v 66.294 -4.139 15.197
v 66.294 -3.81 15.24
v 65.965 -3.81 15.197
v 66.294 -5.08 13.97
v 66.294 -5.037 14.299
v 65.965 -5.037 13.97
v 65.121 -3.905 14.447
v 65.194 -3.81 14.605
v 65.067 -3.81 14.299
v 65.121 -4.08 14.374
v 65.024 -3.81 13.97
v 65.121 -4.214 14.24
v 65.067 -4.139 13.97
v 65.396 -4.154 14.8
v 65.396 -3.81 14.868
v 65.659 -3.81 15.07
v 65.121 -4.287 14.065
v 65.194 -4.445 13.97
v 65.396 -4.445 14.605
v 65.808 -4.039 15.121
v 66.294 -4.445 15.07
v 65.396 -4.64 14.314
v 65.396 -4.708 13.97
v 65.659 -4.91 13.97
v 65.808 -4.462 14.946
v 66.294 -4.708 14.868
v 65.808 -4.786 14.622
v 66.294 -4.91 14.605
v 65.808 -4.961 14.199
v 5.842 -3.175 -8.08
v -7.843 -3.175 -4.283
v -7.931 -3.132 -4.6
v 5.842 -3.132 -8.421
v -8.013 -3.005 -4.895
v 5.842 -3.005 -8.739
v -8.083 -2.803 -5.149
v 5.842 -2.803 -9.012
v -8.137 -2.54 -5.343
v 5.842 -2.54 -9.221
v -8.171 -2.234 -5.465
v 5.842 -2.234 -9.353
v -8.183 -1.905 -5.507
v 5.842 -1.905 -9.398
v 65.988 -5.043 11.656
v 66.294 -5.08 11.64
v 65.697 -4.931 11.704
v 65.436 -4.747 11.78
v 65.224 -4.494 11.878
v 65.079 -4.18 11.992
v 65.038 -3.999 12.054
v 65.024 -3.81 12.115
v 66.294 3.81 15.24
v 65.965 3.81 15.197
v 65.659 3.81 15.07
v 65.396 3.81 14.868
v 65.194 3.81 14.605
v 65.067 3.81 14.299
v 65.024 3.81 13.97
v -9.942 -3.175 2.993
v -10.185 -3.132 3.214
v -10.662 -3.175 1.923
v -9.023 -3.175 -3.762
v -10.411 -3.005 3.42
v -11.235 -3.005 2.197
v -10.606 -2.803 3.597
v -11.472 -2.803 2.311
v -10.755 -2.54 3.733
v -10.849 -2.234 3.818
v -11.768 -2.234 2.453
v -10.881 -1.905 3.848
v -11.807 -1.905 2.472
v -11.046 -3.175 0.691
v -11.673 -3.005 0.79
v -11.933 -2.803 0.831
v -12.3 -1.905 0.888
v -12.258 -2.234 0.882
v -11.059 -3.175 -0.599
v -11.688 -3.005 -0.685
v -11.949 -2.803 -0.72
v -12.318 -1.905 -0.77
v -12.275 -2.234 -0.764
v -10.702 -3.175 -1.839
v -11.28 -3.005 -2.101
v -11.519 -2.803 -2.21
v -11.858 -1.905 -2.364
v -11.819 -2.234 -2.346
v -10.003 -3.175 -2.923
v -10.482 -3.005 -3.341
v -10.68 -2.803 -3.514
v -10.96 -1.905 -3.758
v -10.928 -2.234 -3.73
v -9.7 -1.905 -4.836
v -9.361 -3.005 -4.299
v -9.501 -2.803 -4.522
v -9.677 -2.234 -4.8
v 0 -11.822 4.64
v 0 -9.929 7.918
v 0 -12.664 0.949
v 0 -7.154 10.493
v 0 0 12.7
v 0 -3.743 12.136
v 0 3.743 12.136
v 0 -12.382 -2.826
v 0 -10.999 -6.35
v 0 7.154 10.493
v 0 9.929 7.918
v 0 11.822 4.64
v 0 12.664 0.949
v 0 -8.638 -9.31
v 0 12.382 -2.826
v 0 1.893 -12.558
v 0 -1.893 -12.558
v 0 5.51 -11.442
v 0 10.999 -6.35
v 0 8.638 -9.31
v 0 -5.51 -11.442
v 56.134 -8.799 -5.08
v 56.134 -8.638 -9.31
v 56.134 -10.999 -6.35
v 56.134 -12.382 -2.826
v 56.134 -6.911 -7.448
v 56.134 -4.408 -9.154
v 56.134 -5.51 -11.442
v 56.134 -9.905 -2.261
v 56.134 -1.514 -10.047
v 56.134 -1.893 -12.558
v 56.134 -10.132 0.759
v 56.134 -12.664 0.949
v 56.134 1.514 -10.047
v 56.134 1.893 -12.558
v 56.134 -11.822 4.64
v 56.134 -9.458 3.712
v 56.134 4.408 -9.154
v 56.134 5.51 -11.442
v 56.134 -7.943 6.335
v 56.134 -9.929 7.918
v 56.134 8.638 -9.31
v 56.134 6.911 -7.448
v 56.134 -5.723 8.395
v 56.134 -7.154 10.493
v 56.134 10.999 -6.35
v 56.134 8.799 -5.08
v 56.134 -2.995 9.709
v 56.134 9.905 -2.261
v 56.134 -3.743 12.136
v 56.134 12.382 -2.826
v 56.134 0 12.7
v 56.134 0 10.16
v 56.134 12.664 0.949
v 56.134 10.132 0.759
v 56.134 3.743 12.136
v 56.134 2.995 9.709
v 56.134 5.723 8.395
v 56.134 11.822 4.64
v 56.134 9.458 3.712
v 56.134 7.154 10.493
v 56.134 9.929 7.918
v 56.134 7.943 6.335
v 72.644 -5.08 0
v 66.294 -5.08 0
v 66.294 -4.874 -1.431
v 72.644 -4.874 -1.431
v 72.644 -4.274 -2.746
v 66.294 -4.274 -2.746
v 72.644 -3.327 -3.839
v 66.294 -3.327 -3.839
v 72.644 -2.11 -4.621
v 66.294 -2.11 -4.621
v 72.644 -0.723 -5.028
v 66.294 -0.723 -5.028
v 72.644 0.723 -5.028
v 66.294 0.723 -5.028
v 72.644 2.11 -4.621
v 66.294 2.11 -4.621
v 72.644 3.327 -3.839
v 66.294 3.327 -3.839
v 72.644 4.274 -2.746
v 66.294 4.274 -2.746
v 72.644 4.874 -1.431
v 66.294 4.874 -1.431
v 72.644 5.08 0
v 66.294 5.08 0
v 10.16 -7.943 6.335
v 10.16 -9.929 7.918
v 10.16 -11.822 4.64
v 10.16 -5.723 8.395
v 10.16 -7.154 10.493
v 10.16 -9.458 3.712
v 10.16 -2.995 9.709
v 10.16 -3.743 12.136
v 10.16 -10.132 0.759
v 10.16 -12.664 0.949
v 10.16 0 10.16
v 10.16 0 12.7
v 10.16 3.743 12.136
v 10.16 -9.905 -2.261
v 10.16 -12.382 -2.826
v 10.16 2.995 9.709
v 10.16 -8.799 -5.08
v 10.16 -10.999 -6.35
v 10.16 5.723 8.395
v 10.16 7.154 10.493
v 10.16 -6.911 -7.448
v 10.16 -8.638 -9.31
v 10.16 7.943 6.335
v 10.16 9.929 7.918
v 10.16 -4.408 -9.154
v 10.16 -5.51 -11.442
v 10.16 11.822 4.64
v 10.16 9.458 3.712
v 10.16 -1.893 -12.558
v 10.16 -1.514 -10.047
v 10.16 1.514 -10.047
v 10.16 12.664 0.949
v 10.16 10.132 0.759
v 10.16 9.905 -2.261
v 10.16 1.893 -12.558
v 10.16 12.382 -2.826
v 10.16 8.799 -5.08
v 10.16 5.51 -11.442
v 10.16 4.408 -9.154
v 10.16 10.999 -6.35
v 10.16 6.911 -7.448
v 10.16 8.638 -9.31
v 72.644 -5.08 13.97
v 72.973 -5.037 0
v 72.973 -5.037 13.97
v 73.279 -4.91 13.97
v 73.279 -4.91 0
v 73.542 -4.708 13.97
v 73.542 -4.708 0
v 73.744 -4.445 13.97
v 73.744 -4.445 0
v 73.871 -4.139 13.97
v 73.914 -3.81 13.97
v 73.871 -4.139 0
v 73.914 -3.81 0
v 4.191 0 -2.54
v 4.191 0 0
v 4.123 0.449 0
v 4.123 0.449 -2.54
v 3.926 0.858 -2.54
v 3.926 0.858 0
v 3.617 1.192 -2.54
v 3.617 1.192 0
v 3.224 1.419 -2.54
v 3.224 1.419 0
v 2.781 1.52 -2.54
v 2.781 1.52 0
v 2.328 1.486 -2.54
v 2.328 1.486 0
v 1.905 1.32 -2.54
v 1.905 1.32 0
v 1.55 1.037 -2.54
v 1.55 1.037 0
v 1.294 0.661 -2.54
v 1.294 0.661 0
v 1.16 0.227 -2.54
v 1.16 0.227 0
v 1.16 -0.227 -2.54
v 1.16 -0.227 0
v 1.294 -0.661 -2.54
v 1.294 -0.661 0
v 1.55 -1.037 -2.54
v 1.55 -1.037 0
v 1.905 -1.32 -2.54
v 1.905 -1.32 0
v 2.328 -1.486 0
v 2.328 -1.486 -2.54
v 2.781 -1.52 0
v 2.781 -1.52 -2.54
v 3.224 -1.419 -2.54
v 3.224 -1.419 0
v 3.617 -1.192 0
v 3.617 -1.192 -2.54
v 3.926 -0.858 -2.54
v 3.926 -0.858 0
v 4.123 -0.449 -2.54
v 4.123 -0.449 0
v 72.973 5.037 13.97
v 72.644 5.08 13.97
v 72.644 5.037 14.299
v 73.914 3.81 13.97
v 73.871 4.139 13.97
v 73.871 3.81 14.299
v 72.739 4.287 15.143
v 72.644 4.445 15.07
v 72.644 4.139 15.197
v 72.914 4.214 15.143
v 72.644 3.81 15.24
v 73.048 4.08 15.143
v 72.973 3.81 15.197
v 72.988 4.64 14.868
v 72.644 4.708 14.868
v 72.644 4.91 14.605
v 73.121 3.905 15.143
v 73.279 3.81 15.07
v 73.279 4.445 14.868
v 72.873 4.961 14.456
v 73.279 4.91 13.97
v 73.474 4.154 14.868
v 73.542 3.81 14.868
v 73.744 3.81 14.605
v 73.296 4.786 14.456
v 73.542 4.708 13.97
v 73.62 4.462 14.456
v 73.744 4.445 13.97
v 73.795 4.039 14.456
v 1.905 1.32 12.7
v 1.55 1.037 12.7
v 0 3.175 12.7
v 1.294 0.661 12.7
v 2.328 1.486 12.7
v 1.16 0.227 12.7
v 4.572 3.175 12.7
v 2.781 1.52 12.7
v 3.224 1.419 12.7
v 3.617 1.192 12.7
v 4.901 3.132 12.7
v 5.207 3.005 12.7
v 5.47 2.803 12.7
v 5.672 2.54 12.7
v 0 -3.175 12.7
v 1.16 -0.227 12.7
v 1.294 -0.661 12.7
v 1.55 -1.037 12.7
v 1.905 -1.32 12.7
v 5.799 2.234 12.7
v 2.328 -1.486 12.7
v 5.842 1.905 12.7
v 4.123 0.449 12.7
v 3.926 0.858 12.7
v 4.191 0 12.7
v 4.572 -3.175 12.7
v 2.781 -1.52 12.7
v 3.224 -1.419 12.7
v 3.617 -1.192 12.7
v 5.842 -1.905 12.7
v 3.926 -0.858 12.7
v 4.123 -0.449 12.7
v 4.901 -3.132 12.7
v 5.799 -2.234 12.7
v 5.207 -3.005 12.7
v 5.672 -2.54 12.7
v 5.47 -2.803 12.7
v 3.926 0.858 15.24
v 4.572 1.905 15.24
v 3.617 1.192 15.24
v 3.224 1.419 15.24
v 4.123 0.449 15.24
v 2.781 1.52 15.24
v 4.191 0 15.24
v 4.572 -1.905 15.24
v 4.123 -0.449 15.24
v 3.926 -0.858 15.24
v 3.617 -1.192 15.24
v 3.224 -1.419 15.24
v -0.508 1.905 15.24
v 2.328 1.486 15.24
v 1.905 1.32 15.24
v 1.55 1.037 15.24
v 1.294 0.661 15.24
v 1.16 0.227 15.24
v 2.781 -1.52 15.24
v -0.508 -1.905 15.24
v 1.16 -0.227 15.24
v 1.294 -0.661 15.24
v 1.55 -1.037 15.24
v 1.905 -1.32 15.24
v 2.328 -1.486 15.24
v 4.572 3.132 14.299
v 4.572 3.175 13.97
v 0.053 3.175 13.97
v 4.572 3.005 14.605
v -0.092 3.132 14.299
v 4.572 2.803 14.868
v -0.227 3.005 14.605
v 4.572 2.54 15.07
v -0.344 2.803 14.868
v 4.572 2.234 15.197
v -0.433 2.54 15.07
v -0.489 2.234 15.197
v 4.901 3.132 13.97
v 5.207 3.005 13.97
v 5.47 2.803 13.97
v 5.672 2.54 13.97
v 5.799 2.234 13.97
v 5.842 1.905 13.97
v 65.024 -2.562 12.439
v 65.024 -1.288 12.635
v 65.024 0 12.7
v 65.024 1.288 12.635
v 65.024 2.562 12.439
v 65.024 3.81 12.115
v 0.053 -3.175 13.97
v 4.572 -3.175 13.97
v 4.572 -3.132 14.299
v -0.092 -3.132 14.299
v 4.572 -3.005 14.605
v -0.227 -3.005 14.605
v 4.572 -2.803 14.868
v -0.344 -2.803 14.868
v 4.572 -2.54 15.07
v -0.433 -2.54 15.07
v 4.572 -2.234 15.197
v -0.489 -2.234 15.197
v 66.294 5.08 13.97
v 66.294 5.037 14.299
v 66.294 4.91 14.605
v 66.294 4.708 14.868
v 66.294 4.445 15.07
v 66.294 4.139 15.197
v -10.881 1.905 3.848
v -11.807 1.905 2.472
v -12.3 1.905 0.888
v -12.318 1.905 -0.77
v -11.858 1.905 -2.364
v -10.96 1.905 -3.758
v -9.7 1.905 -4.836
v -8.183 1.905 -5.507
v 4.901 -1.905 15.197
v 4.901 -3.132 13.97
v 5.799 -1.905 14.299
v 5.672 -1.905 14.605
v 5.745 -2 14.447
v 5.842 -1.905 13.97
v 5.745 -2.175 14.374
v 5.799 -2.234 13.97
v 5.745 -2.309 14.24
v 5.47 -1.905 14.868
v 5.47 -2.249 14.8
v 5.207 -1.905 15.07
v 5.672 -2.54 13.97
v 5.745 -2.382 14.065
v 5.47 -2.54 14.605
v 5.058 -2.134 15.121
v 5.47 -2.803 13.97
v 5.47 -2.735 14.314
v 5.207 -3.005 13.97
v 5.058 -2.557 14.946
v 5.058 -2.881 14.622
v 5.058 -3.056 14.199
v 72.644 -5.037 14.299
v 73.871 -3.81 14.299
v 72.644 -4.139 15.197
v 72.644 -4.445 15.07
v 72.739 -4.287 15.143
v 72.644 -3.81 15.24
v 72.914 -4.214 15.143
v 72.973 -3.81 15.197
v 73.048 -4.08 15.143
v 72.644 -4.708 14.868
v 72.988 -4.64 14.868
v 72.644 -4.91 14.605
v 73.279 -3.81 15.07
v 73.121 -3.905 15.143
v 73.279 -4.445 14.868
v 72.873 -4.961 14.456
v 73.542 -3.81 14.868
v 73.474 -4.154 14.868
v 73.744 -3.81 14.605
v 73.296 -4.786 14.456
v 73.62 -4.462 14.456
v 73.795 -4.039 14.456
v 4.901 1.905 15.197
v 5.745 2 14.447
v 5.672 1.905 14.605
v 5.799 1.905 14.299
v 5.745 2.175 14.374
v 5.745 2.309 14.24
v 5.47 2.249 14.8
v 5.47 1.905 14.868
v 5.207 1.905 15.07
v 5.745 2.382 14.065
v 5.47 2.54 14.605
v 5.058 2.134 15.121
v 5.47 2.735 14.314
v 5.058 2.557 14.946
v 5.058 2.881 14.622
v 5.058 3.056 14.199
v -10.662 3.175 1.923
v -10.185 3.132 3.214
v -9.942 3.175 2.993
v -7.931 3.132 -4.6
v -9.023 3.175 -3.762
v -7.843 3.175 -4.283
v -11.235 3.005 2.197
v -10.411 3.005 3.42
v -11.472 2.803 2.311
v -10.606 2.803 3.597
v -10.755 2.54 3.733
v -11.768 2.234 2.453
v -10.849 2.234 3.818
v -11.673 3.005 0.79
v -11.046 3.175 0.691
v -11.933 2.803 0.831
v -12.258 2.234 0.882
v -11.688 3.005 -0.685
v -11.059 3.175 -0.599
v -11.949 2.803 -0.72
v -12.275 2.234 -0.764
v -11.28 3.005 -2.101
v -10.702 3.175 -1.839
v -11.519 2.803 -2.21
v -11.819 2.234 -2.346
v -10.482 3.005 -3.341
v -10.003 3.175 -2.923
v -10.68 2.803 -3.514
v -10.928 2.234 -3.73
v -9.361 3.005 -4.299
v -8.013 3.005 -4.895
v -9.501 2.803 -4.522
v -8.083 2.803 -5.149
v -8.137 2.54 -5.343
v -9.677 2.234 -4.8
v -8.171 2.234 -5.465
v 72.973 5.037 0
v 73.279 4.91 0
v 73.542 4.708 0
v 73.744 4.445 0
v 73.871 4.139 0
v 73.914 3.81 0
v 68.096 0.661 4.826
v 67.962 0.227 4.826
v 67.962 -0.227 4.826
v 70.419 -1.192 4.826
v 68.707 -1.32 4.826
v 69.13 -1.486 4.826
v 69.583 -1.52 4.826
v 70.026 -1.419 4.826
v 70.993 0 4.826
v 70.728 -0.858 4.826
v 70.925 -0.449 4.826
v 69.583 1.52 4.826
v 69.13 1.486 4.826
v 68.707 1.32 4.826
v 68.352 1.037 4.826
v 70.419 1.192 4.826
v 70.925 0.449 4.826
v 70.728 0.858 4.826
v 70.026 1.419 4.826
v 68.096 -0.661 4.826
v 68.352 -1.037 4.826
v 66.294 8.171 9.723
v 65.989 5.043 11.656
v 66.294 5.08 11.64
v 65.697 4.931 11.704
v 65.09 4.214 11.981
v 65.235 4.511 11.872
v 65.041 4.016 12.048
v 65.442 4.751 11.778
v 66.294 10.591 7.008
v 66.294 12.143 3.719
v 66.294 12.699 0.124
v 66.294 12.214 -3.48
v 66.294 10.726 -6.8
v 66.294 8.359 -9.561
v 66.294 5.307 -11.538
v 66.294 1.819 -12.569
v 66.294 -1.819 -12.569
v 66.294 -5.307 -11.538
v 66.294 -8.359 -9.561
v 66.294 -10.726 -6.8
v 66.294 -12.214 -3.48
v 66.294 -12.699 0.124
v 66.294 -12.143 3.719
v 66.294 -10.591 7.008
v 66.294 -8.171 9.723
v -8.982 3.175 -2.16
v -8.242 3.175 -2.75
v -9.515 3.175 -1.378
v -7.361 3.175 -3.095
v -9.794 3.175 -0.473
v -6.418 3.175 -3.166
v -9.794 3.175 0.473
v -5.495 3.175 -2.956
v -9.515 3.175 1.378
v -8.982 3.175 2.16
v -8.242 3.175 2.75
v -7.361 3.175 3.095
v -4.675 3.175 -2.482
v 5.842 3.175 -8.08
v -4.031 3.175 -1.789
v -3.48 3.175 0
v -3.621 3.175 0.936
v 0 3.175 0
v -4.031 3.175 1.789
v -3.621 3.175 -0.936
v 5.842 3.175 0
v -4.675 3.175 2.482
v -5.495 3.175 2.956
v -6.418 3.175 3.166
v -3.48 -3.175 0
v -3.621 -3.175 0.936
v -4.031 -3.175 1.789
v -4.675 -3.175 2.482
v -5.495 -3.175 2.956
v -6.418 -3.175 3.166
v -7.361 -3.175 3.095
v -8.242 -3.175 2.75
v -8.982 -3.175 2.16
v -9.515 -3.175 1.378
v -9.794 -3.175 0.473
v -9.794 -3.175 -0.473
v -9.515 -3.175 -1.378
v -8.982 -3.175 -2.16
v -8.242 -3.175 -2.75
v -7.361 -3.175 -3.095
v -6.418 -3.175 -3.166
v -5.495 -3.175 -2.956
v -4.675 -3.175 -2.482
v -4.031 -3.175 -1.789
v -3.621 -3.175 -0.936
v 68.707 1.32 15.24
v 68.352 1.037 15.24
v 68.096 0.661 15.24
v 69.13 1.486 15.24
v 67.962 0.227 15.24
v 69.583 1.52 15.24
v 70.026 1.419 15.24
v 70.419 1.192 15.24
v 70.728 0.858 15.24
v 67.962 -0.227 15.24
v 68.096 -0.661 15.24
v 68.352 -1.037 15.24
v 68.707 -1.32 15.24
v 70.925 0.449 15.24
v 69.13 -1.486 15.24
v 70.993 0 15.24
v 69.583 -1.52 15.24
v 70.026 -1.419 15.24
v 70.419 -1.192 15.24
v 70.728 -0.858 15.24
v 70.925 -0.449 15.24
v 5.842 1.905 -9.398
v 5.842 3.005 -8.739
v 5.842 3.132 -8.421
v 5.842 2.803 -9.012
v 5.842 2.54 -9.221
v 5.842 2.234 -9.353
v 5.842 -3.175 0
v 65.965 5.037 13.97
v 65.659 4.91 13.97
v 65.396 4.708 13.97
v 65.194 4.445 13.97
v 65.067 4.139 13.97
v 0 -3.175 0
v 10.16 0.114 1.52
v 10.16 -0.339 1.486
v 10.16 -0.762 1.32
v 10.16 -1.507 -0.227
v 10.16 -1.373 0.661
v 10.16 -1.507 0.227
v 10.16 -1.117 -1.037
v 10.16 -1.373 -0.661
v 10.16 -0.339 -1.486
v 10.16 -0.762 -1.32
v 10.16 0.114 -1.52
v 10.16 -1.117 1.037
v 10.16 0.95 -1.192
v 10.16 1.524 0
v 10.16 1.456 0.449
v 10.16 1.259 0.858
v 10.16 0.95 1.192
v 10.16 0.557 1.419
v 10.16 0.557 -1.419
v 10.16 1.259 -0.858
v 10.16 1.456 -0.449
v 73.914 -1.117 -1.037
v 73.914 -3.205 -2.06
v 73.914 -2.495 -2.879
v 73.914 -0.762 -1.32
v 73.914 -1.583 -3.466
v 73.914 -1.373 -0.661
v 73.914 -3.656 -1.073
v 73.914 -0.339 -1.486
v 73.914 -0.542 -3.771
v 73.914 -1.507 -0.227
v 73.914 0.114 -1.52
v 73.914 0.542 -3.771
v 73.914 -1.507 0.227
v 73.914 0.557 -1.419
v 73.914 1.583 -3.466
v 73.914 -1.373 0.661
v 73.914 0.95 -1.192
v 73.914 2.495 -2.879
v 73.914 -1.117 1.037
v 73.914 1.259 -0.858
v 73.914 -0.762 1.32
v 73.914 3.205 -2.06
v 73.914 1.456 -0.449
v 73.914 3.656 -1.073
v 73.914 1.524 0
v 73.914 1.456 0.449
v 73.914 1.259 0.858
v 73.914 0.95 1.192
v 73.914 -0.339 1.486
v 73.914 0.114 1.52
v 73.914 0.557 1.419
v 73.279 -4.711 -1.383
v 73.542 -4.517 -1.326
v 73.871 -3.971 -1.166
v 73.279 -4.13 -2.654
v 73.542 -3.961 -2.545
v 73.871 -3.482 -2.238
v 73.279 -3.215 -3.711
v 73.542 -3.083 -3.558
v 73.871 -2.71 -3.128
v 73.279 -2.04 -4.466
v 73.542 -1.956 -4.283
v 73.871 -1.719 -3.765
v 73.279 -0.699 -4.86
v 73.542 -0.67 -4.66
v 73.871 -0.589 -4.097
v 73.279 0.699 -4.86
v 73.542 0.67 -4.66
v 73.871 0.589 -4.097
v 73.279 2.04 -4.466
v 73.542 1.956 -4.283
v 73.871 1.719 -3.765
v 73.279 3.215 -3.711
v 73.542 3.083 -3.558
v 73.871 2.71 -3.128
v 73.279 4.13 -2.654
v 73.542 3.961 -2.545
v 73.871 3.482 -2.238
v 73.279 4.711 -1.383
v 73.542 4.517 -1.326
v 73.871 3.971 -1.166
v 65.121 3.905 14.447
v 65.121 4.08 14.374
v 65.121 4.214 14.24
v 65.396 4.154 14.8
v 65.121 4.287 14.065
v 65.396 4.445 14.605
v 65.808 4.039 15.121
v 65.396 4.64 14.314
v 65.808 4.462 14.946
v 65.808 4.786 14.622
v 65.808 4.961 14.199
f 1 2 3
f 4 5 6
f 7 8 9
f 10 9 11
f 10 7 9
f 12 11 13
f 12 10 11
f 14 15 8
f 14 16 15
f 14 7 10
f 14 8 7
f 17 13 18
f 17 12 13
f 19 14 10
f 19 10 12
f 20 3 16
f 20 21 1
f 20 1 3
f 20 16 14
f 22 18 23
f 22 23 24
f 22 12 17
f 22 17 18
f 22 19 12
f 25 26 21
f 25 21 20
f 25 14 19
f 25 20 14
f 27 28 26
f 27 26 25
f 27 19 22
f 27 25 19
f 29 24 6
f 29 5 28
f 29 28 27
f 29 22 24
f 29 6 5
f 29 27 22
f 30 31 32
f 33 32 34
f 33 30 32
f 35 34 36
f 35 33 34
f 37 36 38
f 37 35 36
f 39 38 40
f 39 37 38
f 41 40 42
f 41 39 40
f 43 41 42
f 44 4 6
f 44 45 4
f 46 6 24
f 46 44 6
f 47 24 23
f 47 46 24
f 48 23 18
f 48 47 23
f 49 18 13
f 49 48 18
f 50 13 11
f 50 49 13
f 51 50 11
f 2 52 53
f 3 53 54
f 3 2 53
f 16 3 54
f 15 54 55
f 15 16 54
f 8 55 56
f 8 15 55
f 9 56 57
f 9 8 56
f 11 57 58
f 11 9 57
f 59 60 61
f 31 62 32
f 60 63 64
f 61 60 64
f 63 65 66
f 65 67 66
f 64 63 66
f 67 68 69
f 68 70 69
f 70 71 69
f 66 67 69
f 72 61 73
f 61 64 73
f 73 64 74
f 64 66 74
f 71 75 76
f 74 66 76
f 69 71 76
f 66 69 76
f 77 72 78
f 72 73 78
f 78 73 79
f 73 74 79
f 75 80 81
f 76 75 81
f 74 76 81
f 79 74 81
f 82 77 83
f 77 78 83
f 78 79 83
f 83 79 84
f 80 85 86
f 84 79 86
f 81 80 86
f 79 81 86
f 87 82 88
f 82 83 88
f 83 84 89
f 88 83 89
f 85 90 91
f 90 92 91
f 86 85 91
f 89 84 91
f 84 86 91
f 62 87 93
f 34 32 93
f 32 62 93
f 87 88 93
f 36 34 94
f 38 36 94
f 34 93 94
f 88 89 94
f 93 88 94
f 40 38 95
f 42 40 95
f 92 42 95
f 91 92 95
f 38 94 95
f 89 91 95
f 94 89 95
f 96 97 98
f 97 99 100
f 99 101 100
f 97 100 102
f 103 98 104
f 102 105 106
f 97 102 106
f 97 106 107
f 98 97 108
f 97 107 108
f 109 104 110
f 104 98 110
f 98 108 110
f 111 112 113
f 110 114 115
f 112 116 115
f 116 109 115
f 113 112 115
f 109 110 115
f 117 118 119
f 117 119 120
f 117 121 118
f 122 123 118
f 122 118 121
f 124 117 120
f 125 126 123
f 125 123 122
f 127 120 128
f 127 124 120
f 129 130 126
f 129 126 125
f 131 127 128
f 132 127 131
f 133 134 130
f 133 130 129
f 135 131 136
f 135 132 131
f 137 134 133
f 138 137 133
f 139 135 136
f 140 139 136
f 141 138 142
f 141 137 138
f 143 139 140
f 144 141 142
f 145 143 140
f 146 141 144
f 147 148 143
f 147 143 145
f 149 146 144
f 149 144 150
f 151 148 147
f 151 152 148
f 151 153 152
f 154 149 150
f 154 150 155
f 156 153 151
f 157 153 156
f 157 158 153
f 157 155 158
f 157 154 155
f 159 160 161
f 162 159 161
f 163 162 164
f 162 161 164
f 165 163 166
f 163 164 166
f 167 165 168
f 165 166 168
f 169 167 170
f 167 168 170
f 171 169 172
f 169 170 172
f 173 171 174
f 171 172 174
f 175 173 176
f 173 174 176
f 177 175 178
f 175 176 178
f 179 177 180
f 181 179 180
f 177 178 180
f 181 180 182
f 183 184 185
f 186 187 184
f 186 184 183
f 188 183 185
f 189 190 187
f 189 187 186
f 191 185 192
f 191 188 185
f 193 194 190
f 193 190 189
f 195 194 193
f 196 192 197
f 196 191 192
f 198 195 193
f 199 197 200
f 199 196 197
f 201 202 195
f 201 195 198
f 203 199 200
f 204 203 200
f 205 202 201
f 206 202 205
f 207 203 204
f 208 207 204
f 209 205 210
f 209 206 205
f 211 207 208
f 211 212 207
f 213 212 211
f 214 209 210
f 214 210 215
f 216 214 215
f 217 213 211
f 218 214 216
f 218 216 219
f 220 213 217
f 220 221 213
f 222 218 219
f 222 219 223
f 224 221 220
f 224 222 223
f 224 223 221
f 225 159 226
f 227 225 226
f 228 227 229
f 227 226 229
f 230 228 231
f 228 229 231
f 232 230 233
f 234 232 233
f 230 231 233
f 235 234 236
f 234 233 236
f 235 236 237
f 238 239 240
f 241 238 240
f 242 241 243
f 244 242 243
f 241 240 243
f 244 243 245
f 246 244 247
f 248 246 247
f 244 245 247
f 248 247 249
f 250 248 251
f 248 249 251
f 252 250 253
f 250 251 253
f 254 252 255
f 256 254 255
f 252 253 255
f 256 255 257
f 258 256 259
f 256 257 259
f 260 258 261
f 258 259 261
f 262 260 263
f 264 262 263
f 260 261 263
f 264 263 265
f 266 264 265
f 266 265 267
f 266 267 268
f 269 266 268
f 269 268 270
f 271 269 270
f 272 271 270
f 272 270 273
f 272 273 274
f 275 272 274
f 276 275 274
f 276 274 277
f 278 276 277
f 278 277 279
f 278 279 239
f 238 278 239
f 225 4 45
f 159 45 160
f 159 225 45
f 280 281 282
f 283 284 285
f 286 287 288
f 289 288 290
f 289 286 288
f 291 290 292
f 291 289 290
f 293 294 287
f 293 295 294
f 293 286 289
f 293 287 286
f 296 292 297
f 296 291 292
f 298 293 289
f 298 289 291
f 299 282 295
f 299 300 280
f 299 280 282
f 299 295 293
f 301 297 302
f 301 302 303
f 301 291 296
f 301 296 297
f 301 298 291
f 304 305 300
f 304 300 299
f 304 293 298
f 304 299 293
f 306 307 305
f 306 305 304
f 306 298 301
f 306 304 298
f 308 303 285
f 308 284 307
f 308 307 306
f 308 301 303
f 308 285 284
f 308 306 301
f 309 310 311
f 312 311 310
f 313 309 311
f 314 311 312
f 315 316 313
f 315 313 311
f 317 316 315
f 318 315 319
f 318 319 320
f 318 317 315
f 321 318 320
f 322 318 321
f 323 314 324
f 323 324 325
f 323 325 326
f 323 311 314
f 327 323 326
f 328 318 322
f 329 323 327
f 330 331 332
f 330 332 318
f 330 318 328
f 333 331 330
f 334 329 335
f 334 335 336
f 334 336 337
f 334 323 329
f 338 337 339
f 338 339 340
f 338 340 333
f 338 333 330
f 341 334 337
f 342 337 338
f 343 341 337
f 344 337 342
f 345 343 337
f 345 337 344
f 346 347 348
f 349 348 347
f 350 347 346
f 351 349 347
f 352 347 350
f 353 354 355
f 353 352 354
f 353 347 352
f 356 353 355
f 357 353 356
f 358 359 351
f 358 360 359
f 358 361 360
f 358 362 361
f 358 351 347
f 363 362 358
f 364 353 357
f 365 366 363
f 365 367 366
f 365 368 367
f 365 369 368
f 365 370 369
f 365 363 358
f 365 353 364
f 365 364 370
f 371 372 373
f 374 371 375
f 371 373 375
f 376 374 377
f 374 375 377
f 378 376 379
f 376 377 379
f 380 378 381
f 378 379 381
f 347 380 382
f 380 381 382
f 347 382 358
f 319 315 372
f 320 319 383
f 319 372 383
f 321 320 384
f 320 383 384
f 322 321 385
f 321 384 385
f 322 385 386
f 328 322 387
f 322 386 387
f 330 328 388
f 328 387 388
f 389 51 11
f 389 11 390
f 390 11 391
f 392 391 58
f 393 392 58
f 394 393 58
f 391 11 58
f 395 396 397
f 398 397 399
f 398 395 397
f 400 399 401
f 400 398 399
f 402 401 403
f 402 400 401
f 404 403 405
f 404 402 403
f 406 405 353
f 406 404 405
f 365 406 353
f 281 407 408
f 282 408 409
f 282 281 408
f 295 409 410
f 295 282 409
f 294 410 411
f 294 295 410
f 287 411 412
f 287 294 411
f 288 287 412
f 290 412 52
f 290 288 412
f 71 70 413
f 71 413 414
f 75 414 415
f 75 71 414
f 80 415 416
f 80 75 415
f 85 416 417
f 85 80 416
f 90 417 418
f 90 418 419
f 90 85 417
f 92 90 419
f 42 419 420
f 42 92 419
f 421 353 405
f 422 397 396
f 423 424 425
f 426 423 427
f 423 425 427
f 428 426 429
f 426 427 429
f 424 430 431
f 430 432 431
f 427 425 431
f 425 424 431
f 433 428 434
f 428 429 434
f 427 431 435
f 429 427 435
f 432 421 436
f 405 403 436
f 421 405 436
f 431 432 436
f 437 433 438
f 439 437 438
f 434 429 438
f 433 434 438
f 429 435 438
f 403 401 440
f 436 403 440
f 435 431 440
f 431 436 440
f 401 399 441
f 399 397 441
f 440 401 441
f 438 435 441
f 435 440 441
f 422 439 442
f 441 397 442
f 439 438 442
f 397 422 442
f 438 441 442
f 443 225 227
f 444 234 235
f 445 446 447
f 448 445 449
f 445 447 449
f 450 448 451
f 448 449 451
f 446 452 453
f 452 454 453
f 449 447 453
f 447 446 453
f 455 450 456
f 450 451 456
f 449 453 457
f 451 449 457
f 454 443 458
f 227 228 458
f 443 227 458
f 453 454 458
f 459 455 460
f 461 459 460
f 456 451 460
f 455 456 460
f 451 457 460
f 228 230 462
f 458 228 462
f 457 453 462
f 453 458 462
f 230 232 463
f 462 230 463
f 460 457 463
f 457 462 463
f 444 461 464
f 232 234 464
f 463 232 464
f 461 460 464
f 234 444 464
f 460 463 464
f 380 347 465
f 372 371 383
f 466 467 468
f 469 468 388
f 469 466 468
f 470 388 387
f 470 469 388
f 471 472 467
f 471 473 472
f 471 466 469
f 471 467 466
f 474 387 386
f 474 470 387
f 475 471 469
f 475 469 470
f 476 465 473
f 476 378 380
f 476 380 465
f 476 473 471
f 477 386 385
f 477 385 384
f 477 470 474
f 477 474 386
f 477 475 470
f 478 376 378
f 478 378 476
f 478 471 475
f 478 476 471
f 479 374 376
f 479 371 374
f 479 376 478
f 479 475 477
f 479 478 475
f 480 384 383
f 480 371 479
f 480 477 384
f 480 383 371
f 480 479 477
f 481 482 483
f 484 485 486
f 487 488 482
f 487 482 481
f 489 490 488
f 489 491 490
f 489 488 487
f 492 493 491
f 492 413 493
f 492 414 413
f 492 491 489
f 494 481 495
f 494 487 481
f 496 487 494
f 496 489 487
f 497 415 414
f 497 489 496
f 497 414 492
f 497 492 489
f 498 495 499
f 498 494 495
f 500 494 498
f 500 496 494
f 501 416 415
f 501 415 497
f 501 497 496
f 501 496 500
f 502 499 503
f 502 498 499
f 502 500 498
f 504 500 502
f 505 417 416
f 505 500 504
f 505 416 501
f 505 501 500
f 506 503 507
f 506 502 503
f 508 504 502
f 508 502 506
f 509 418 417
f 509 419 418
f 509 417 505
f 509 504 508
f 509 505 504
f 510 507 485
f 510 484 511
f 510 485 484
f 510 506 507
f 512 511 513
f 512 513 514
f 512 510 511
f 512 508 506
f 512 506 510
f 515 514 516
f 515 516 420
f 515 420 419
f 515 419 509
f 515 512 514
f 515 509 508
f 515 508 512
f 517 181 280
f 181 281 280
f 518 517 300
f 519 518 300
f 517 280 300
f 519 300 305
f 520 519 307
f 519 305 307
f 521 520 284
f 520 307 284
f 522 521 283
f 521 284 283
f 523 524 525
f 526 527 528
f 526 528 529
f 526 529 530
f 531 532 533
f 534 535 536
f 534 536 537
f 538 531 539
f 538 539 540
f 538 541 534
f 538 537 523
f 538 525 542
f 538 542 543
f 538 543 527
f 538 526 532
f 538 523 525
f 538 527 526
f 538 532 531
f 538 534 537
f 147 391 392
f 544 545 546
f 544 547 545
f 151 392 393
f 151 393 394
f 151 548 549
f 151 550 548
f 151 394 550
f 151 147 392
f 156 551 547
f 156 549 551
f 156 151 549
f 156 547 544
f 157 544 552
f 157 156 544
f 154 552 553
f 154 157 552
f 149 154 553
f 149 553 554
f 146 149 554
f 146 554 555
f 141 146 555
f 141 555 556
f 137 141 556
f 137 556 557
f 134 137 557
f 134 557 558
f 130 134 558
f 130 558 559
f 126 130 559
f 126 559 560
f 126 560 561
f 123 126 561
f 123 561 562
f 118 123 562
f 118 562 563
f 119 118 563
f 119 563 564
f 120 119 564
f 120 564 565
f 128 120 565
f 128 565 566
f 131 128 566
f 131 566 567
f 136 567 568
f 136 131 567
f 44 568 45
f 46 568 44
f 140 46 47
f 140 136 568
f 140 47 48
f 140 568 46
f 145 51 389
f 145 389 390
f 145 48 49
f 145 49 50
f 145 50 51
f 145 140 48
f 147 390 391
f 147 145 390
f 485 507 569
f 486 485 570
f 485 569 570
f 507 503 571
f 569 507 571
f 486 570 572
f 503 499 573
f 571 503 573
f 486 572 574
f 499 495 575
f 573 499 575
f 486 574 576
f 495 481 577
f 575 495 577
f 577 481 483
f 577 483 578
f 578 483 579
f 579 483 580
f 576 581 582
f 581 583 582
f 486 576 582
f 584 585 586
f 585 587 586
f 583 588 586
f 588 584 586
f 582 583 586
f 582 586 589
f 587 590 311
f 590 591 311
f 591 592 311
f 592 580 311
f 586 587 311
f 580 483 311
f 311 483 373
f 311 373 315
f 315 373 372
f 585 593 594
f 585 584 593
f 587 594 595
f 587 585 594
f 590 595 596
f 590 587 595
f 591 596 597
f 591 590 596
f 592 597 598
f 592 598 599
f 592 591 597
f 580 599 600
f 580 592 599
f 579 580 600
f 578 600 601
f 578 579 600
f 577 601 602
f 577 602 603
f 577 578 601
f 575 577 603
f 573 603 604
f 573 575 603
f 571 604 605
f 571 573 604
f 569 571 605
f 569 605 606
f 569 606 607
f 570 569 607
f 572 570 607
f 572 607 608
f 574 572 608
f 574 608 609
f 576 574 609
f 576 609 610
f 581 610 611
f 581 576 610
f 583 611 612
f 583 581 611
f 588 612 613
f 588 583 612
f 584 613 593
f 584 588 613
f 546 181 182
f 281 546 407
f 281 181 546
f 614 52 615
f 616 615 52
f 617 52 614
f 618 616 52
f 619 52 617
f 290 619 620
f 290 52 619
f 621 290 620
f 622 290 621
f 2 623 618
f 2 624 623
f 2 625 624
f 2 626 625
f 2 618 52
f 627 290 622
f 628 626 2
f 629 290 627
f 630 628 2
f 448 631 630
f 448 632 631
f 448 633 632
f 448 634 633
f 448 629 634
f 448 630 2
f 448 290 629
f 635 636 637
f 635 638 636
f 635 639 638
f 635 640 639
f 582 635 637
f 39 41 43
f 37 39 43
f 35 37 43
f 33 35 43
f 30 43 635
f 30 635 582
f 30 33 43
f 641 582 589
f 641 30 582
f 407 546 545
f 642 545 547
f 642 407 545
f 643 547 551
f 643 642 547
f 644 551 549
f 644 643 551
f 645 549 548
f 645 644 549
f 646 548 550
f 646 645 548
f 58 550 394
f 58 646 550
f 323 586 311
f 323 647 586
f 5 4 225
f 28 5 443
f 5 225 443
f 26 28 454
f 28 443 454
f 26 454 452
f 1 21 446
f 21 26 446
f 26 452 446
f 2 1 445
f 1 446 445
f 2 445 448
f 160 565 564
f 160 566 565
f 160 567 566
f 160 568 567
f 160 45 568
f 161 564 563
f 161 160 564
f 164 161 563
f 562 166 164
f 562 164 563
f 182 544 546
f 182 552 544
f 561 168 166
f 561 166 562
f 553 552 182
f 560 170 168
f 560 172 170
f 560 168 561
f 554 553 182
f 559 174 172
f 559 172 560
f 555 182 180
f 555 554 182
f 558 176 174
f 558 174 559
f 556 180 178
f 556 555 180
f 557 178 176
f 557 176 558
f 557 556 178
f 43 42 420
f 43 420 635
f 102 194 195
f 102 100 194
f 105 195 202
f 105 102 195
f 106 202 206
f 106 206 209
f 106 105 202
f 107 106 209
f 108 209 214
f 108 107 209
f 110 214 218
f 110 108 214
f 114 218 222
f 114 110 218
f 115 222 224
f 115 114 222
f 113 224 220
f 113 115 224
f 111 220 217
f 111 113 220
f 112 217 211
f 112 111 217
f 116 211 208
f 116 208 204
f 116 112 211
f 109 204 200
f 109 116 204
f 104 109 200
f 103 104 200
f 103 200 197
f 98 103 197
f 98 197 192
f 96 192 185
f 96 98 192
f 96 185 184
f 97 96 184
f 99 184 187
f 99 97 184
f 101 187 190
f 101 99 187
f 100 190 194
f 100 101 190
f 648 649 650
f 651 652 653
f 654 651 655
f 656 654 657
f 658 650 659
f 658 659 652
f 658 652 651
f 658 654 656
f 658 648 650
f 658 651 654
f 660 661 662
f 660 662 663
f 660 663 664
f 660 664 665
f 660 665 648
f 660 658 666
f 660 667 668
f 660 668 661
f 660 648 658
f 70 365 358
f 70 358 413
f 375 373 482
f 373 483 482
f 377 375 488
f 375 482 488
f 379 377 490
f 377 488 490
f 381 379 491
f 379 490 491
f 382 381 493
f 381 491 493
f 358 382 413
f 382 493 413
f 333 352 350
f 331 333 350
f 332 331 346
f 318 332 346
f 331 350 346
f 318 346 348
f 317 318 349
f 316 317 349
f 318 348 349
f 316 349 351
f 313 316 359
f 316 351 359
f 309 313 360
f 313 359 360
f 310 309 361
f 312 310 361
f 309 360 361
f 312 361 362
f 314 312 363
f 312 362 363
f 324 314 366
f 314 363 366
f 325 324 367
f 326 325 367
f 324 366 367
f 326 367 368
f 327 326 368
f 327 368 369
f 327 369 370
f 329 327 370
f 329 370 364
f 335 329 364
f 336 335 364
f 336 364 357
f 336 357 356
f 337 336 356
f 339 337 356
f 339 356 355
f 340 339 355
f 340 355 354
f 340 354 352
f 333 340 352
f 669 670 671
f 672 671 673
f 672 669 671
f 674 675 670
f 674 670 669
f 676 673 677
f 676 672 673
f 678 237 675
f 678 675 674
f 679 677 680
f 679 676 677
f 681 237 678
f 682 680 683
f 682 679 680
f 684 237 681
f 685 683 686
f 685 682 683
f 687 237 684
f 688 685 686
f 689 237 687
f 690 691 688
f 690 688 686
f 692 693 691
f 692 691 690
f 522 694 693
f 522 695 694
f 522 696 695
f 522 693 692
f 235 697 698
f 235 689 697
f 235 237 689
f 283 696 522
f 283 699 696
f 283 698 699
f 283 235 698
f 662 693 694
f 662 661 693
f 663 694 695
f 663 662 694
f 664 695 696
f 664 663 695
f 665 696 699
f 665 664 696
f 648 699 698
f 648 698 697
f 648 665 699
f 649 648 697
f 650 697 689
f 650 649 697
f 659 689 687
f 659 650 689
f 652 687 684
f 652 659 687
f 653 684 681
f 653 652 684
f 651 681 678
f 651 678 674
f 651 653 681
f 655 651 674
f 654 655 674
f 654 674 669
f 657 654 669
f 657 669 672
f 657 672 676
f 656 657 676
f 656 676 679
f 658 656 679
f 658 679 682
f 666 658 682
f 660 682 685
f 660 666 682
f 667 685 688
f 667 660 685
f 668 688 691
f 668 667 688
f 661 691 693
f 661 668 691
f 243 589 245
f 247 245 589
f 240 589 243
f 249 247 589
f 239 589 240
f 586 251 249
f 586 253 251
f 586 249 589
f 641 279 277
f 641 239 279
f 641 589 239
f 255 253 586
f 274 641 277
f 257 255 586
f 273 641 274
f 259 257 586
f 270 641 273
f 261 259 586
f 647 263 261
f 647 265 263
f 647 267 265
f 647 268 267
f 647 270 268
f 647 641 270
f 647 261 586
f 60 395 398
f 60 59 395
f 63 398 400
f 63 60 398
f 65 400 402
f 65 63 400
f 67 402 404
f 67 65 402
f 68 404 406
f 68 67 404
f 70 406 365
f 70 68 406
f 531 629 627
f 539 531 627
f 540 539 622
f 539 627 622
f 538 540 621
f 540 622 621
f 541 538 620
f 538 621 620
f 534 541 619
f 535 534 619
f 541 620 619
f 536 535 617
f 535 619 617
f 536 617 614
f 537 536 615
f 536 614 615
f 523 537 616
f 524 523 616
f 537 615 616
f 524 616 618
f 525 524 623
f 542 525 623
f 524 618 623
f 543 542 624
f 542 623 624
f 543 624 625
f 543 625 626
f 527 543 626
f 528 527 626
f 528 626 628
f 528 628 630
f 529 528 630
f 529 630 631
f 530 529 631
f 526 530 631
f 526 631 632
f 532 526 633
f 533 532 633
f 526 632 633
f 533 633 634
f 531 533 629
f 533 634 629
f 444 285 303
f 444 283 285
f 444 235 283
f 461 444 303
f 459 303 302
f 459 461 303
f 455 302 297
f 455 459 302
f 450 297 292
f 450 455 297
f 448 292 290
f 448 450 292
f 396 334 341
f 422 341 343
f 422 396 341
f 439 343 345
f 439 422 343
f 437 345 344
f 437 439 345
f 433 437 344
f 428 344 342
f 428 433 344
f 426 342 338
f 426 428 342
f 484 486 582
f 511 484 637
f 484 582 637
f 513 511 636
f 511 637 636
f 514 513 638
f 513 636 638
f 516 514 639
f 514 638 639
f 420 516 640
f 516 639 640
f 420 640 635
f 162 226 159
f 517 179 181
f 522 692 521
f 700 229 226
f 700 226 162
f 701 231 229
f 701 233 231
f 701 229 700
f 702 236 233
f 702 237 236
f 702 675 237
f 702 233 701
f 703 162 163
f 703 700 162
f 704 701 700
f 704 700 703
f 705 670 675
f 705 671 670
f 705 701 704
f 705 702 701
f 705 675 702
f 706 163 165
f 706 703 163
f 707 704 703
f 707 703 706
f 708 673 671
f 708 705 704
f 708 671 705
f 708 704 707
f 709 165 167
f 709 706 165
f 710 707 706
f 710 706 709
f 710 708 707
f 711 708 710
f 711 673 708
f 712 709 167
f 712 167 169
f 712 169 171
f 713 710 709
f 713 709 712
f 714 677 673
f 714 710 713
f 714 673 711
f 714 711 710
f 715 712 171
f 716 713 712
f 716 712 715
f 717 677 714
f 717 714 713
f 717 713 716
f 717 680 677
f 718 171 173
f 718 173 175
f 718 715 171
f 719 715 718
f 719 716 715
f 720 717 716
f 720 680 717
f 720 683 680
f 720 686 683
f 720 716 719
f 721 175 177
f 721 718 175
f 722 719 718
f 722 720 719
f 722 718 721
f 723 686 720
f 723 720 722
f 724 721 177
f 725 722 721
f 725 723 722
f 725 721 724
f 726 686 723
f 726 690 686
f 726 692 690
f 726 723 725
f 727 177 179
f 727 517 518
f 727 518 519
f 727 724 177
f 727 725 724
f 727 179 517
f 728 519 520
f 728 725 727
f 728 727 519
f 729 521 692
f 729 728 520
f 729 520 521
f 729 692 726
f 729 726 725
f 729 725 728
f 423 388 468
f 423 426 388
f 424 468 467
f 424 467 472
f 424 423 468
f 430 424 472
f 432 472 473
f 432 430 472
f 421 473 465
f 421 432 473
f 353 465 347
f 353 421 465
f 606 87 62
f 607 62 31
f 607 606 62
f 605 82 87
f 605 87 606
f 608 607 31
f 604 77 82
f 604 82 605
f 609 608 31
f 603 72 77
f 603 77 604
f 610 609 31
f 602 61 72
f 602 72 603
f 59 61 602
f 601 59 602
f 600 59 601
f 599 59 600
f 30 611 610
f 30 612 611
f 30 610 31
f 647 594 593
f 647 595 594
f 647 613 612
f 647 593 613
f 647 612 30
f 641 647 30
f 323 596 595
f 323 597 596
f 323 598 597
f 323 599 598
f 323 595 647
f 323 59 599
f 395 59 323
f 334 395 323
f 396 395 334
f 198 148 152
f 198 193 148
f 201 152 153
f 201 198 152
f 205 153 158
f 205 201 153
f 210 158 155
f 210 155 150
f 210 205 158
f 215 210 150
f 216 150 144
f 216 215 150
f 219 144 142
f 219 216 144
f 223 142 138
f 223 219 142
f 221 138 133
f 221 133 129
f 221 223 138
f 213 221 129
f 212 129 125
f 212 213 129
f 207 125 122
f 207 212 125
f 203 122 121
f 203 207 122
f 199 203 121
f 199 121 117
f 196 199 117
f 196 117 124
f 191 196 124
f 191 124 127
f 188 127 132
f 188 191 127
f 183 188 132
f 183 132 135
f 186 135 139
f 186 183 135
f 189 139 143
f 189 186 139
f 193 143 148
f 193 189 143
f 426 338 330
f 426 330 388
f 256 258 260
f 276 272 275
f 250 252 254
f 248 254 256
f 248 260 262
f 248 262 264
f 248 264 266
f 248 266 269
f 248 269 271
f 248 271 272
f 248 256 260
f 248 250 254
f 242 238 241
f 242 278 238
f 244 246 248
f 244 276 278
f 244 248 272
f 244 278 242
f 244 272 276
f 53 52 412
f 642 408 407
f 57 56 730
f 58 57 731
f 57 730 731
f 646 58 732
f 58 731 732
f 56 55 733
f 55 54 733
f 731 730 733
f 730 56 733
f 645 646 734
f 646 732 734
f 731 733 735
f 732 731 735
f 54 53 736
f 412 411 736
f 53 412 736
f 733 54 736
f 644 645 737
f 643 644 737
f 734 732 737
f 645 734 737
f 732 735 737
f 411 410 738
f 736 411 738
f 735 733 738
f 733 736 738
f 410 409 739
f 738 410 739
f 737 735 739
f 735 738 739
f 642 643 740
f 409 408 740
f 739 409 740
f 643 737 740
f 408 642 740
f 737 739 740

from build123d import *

# Parameters (mm, degrees)
F0_W      = 5.842
F0_H      = 12.7
F0_R      = 3.175
F2_DEPTH  = 3.175
F3_R      = 1.524
F4_DEPTH  = 7.62
F5_DEPTH  = 1.27
F6_DEPTH  = 56.134
F8_R      = 1.524
F9_DEPTH  = 17.78
F10_R     = 1.27
F10_2_R   = 1.27
F7_R      = 1.524
F11_DEPTH = 10.414


with BuildPart() as f1:
    # F0 (on Front) → F1 (revolve)
    with BuildSketch(Plane.XZ):
        Polygon((5.842, 12.7), (5.842, 0), (66.294, 0), (66.294, 12.7), (56.134, 12.7), (56.134, 10.16), (10.16, 10.16), (10.16, 12.7), align=None)
        with Locations((2.921, 6.35)):
            Rectangle(F0_W, F0_H)
    revolve(axis=Axis((33.147, 0, 0), (-1, 0, 0)))

    # F3 (on face) → F4 (join)
    with BuildSketch(Plane.YZ.offset(66.294)):
        with BuildLine():
            ThreePointArc((-5.08, 11.6397422652), (0, 12.7), (5.08, 11.6397422652))
            Line((5.08, 11.6397422652), (5.08, 15.24))
            Line((5.08, 15.24), (-5.08, 15.24))
            Line((-5.08, 15.24), (-5.08, 11.6397422652))
        make_face()
        with BuildLine():
            ThreePointArc((-5.08, 0), (0, 5.08), (5.08, 0))
            Line((5.08, 0), (5.08, 11.6397422652))
            ThreePointArc((5.08, 11.6397422652), (0, 12.7), (-5.08, 11.6397422652))
            Line((-5.08, 11.6397422652), (-5.08, 0))
        make_face()
        with BuildLine():
            ThreePointArc((-5.08, 0), (0, -5.08), (5.08, 0))
            ThreePointArc((5.08, 0), (0, 5.08), (-5.08, 0))
        make_face()
        Circle(F3_R, mode=Mode.SUBTRACT)
    extrude(amount=F4_DEPTH)

    # F5 (add): a face of the model
    f5_faces = [f1.faces().sort_by_distance(p)[0] for p in [
        (66.294, 0, 13.7792682875),
    ]]
    extrude(f5_faces, amount=F5_DEPTH)

    # F6 (cut, through all): a face of the model
    f6_faces = [f1.faces().sort_by_distance(p)[0] for p in [
        (66.294, 0, 0),
    ]]
    extrude(f6_faces, amount=-F6_DEPTH, mode=Mode.SUBTRACT)

    # F10
    f10_edges = [f1.edges().sort_by_distance(p)[0] for p in [
        (73.914, -5.08, 7.62),
        (69.469, -5.08, 15.24),
        (69.469, 5.08, 15.24),
        (73.914, 0, 15.24),
        (65.024, 0, 15.24),
        (65.024, -5.08, 13.439871),
        (65.024, 5.08, 13.439871),
    ]]
    fillet(f10_edges, radius=F10_R)

    # F7 (on face) → F11 (cut)
    with BuildSketch(Plane.XY.offset(15.24)):
        with Locations((69.469, 0)):
            Circle(F7_R)
    extrude(amount=-F11_DEPTH, mode=Mode.SUBTRACT)


with BuildPart() as f2:
    # F0 (on Front) → F2 (new body, symmetric)
    with BuildSketch(Plane.XZ):
        with BuildLine():
            Line((-0.9398, 0), (0, 0))
            Line((0, 0), (0, 12.7))
            Line((0, 12.7), (5.842, 12.7))
            Line((5.842, 12.7), (5.842, 15.24))
            Line((5.842, 15.24), (-0.508, 15.24))
            Line((-0.508, 15.24), (-10.8806298187, 3.8475430269))
            ThreePointArc((-10.8806298187, 3.8475430269), (-4.5919612295, 5.3297205562), (-0.9398, 0))
        make_face()
        with BuildLine():
            Line((5.842, 0), (0, 0))
            Line((0, 0), (-0.9398, 0))
            ThreePointArc((-0.9398, 0), (-3.1957909266, -4.5493385486), (-8.1826630726, -5.5069827884))
            Line((-8.1826630726, -5.5069827884), (5.842, -9.398))
            Line((5.842, -9.398), (5.842, 0))
        make_face()
        with BuildLine():
            ThreePointArc((-8.1826630726, -5.5069827884), (-3.1957909266, -4.5493385486), (-0.9398, 0))
            ThreePointArc((-0.9398, 0), (-4.5919612295, 5.3297205562), (-10.8806298187, 3.8475430269))
            ThreePointArc((-10.8806298187, 3.8475430269), (-12.1459778134, -1.5837270034), (-8.1826630726, -5.5069827884))
        make_face()
        with Locations((-6.6548, 0)):
            Circle(F0_R, mode=Mode.SUBTRACT)
    extrude(amount=F2_DEPTH, both=True)

    # F8 (on face) → F9 (cut)
    with BuildSketch(Plane.XY.offset(15.24)):
        with Locations((2.667, 0)):
            Circle(F8_R)
    extrude(amount=-F9_DEPTH, mode=Mode.SUBTRACT)

    # F10#2
    f10_2_edges = [f2.edges().sort_by_distance(p)[0] for p in [
        (-5.694315, 3.175, 9.543772),
        (-5.694315, -3.175, 9.543772),
        (2.667, 3.175, 15.24),
        (2.667, -3.175, 15.24),
        (5.842, 0, 15.24),
        (5.842, 3.175, 13.97),
        (5.842, -3.175, 13.97),
    ]]
    fillet(f10_2_edges, radius=F10_2_R)


solid = Compound([f1.part, f2.part])
